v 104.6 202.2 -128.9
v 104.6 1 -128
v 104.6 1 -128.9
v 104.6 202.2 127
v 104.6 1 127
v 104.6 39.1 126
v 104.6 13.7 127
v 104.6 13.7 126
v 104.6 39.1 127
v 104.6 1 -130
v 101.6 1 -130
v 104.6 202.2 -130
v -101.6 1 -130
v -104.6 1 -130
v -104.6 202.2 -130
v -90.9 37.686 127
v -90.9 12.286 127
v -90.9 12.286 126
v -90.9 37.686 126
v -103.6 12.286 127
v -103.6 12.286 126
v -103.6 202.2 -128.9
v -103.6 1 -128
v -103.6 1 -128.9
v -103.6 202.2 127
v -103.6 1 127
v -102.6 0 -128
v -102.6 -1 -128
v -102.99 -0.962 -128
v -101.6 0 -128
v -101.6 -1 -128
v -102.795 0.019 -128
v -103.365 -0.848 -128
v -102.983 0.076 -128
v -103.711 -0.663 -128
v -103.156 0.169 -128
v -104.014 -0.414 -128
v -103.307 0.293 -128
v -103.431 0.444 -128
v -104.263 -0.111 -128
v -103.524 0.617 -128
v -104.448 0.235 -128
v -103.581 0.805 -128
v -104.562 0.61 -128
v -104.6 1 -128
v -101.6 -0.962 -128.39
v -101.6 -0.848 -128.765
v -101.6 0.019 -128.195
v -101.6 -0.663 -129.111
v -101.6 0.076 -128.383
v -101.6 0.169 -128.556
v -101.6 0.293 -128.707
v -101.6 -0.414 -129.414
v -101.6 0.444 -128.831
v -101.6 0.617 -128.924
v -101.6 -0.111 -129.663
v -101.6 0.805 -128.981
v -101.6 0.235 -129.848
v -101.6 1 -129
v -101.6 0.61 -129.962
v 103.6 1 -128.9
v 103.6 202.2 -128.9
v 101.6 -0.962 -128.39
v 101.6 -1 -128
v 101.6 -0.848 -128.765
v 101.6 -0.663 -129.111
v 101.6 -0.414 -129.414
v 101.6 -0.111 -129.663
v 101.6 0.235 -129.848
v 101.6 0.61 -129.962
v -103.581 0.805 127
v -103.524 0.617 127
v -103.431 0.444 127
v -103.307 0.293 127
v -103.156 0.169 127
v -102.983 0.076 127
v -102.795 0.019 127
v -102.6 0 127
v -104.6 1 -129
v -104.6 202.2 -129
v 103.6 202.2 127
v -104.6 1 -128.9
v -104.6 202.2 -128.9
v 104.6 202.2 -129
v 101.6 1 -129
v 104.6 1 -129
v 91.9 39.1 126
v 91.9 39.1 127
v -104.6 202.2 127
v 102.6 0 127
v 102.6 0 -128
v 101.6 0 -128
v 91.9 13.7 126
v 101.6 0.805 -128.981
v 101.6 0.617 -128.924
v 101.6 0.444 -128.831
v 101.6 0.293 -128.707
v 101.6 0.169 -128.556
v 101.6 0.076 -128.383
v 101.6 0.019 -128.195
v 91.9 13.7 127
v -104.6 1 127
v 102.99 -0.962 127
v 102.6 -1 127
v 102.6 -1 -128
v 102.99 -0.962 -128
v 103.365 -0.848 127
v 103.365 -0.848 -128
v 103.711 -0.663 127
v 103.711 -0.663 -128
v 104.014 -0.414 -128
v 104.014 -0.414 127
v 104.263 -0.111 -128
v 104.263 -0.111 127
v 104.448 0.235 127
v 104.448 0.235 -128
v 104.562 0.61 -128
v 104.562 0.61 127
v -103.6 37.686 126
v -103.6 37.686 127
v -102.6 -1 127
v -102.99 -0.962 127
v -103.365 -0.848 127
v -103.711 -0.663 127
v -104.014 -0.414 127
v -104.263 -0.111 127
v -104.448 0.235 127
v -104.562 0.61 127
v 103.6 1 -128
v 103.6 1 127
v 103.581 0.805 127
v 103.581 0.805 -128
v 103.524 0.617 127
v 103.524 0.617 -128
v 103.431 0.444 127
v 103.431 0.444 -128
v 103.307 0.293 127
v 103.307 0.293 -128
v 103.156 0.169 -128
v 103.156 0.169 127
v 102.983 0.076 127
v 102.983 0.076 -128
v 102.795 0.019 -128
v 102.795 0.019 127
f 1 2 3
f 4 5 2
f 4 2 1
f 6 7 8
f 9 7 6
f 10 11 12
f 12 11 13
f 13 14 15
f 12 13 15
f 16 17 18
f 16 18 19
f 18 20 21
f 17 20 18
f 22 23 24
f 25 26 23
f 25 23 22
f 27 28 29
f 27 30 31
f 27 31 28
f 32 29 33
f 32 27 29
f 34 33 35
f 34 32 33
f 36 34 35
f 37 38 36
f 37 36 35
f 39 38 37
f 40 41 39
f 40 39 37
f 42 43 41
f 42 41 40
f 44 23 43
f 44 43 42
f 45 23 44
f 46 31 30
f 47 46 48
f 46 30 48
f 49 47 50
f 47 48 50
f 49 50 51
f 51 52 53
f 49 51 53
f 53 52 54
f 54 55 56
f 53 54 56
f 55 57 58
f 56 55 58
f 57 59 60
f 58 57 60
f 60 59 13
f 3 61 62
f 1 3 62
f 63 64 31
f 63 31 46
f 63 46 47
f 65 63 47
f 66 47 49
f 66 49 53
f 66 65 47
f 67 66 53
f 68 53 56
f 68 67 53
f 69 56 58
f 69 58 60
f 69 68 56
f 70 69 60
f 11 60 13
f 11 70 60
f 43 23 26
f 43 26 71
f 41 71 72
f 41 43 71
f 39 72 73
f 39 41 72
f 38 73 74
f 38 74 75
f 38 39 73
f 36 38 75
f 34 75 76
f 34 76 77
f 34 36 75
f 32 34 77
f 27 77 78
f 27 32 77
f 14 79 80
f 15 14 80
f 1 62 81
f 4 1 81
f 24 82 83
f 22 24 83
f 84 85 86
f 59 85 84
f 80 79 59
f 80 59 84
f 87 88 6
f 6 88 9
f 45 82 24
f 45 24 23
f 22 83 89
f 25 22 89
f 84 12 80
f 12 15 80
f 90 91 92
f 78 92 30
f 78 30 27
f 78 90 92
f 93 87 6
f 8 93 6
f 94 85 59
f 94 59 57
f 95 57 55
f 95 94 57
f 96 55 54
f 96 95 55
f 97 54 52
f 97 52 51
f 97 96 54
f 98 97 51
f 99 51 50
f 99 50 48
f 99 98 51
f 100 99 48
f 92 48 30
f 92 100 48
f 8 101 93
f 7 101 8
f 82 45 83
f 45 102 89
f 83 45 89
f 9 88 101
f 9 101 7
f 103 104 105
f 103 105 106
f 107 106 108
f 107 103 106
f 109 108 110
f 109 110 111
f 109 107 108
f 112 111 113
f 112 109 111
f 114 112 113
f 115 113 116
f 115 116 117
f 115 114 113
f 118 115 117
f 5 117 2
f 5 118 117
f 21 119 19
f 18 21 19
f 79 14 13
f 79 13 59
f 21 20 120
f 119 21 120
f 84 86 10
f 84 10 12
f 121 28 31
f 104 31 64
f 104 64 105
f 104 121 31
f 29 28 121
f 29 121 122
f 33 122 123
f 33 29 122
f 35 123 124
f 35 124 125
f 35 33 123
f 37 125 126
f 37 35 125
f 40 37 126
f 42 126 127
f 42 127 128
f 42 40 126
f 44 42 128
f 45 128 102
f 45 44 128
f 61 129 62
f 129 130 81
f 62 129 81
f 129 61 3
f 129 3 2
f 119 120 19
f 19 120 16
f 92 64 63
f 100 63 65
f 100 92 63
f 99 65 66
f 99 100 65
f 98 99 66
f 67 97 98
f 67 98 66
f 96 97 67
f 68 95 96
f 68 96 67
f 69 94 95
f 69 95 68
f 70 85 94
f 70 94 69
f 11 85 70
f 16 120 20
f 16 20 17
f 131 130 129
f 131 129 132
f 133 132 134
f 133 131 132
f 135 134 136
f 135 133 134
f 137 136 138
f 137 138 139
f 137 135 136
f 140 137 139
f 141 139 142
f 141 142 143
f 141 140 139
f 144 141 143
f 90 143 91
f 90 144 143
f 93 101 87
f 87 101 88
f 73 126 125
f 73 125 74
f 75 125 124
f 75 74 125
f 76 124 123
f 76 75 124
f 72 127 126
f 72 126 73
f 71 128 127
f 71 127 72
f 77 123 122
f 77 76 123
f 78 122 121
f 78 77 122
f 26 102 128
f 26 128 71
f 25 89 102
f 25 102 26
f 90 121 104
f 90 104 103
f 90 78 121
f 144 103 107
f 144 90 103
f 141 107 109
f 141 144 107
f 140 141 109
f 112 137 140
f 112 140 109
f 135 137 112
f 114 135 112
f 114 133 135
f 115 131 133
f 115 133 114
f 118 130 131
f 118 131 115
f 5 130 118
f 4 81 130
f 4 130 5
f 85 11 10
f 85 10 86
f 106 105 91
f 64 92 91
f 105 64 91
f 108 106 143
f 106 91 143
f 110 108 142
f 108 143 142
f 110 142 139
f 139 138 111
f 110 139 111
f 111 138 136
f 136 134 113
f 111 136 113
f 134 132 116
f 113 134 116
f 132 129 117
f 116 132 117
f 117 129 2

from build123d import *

# Parameters (mm, degrees)
SKETCH1_W                   = 203.2
SKETCH1_H                   = 254
BASE_FLANGE1_DEPTH          = 1
EDGE_FLANGE1_DEPTH          = 203.2
EDGE_FLANGE2_DEPTH          = 255
EDGE_FLANGE3_DEPTH          = 255
CLOSED_START                = -104.6
CLOSED_CORNER13_OUTLINE_W   = 201.2
CLOSED_CORNER13_OUTLINE_H   = 1
CLOSED_CORNER13_DEPTH       = 3
CLOSED_CORNER13_2_OUTLINE_W = 201.2
CLOSED_CORNER13_2_OUTLINE_H = 0.9
CLOSED_CORNER13_2_DEPTH     = 1
CLOSED_START_2              = 101.6
CLOSED_CORNER14_OUTLINE_W   = 201.2
CLOSED_CORNER14_OUTLINE_H   = 1
CLOSED_CORNER14_DEPTH       = 3
CLOSED_START_3              = 103.6
CLOSED_CORNER14_2_OUTLINE_W = 201.2
CLOSED_CORNER14_2_OUTLINE_H = 0.9
CLOSED_CORNER14_2_DEPTH     = 1
SKETCH26_W                  = 12.7
SKETCH26_H                  = 25.4
BASE_FLANGE3_DEPTH          = 1
SKETCH31_W                  = 12.7
SKETCH31_H                  = 25.4
BASE_FLANGE4_DEPTH          = 1


# Read off the part's stored shape, not the designer's step: Closed Corner13, Closed Corner14
# Sheet-metal steps are written as plain solids
with BuildPart() as part:
    # Sketch1 → Base-Flange1 (new body)
    with BuildSketch(Plane(origin=(0, 0, 0), x_dir=(1, 0, 0), z_dir=(0, 1, 0))):
        Rectangle(SKETCH1_W, SKETCH1_H)
    extrude(amount=-BASE_FLANGE1_DEPTH)

    # Edge-Flange1 section (across the edge) → Edge-Flange1 (add)
    with BuildSketch(Plane(origin=(101.6, 0, -130), x_dir=(0, 0, 1), z_dir=(-1, 0, 0))):
        with BuildLine():
            Line((0, 1), (0, 202.2))
            Line((0, 202.2), (1, 202.2))
            Line((1, 202.2), (1, 1))
            ThreePointArc((1, 1), (1.292893219, 0.292893219), (2, 0))
            Line((2, 0), (3, 0))
            Line((3, 0), (3, -1))
            Line((3, -1), (2, -1))
            ThreePointArc((2, -1), (0.585786438, -0.414213562), (0, 1))
        make_face()
    extrude(amount=EDGE_FLANGE1_DEPTH)

    # Edge-Flange2 section (across the edge) → Edge-Flange2 (add)
    with BuildSketch(Plane(origin=(-104.6, 0, -128), x_dir=(1, 0, 0), z_dir=(0, 0, 1))):
        with BuildLine():
            Line((0, 1), (0, 202.2))
            Line((0, 202.2), (1, 202.2))
            Line((1, 202.2), (1, 1))
            ThreePointArc((1, 1), (1.292893219, 0.292893219), (2, 0))
            Line((2, 0), (3, 0))
            Line((3, 0), (3, -1))
            Line((3, -1), (2, -1))
            ThreePointArc((2, -1), (0.585786438, -0.414213562), (0, 1))
        make_face()
    extrude(amount=EDGE_FLANGE2_DEPTH)

    # Edge-Flange3 section (across the edge) → Edge-Flange3 (add)
    with BuildSketch(Plane(origin=(104.6, 0, 127), x_dir=(-1, 0, 0), z_dir=(0, 0, -1))):
        with BuildLine():
            Line((0, 1), (0, 202.2))
            Line((0, 202.2), (1, 202.2))
            Line((1, 202.2), (1, 1))
            ThreePointArc((1, 1), (1.292893219, 0.292893219), (2, 0))
            Line((2, 0), (3, 0))
            Line((3, 0), (3, -1))
            Line((3, -1), (2, -1))
            ThreePointArc((2, -1), (0.585786438, -0.414213562), (0, 1))
        make_face()
    extrude(amount=EDGE_FLANGE3_DEPTH)

    # Closed Corner13 outline → Closed Corner13 (add)
    with BuildSketch(Plane.YZ.offset(CLOSED_START)):
        with Locations((101.6, -129.5)):
            Rectangle(CLOSED_CORNER13_OUTLINE_W, CLOSED_CORNER13_OUTLINE_H)
    extrude(amount=CLOSED_CORNER13_DEPTH)

    # Closed Corner13 2 outline → Closed Corner13 2 (add)
    with BuildSketch(Plane.YZ.offset(CLOSED_START)):
        with Locations((101.6, -128.45)):
            Rectangle(CLOSED_CORNER13_2_OUTLINE_W, CLOSED_CORNER13_2_OUTLINE_H)
    extrude(amount=CLOSED_CORNER13_2_DEPTH)

    # Closed Corner14 outline → Closed Corner14 (add)
    with BuildSketch(Plane.YZ.offset(CLOSED_START_2)):
        with Locations((101.6, -129.5)):
            Rectangle(CLOSED_CORNER14_OUTLINE_W, CLOSED_CORNER14_OUTLINE_H)
    extrude(amount=CLOSED_CORNER14_DEPTH)

    # Closed Corner14 2 outline → Closed Corner14 2 (add)
    with BuildSketch(Plane.YZ.offset(CLOSED_START_3)):
        with Locations((101.6, -128.45)):
            Rectangle(CLOSED_CORNER14_2_OUTLINE_W, CLOSED_CORNER14_2_OUTLINE_H)
    extrude(amount=CLOSED_CORNER14_2_DEPTH)


with BuildPart() as body_2:
    # Sketch26 → Base-Flange3 (new body)
    with BuildSketch(Plane(origin=(104.6, 1, 127), x_dir=(1, 0, 0), z_dir=(0, 0, 1))):
        with Locations((-6.35, 25.4)):
            Rectangle(SKETCH26_W, SKETCH26_H)
    extrude(amount=-BASE_FLANGE3_DEPTH)


with BuildPart() as body_3:
    # Sketch31 → Base-Flange4 (new body)
    with BuildSketch(Plane.XY.offset(127)):
        with Locations((-97.25, 24.985786438)):
            Rectangle(SKETCH31_W, SKETCH31_H)
    extrude(amount=-BASE_FLANGE4_DEPTH)


solid = Compound([part.part, body_2.part, body_3.part])
